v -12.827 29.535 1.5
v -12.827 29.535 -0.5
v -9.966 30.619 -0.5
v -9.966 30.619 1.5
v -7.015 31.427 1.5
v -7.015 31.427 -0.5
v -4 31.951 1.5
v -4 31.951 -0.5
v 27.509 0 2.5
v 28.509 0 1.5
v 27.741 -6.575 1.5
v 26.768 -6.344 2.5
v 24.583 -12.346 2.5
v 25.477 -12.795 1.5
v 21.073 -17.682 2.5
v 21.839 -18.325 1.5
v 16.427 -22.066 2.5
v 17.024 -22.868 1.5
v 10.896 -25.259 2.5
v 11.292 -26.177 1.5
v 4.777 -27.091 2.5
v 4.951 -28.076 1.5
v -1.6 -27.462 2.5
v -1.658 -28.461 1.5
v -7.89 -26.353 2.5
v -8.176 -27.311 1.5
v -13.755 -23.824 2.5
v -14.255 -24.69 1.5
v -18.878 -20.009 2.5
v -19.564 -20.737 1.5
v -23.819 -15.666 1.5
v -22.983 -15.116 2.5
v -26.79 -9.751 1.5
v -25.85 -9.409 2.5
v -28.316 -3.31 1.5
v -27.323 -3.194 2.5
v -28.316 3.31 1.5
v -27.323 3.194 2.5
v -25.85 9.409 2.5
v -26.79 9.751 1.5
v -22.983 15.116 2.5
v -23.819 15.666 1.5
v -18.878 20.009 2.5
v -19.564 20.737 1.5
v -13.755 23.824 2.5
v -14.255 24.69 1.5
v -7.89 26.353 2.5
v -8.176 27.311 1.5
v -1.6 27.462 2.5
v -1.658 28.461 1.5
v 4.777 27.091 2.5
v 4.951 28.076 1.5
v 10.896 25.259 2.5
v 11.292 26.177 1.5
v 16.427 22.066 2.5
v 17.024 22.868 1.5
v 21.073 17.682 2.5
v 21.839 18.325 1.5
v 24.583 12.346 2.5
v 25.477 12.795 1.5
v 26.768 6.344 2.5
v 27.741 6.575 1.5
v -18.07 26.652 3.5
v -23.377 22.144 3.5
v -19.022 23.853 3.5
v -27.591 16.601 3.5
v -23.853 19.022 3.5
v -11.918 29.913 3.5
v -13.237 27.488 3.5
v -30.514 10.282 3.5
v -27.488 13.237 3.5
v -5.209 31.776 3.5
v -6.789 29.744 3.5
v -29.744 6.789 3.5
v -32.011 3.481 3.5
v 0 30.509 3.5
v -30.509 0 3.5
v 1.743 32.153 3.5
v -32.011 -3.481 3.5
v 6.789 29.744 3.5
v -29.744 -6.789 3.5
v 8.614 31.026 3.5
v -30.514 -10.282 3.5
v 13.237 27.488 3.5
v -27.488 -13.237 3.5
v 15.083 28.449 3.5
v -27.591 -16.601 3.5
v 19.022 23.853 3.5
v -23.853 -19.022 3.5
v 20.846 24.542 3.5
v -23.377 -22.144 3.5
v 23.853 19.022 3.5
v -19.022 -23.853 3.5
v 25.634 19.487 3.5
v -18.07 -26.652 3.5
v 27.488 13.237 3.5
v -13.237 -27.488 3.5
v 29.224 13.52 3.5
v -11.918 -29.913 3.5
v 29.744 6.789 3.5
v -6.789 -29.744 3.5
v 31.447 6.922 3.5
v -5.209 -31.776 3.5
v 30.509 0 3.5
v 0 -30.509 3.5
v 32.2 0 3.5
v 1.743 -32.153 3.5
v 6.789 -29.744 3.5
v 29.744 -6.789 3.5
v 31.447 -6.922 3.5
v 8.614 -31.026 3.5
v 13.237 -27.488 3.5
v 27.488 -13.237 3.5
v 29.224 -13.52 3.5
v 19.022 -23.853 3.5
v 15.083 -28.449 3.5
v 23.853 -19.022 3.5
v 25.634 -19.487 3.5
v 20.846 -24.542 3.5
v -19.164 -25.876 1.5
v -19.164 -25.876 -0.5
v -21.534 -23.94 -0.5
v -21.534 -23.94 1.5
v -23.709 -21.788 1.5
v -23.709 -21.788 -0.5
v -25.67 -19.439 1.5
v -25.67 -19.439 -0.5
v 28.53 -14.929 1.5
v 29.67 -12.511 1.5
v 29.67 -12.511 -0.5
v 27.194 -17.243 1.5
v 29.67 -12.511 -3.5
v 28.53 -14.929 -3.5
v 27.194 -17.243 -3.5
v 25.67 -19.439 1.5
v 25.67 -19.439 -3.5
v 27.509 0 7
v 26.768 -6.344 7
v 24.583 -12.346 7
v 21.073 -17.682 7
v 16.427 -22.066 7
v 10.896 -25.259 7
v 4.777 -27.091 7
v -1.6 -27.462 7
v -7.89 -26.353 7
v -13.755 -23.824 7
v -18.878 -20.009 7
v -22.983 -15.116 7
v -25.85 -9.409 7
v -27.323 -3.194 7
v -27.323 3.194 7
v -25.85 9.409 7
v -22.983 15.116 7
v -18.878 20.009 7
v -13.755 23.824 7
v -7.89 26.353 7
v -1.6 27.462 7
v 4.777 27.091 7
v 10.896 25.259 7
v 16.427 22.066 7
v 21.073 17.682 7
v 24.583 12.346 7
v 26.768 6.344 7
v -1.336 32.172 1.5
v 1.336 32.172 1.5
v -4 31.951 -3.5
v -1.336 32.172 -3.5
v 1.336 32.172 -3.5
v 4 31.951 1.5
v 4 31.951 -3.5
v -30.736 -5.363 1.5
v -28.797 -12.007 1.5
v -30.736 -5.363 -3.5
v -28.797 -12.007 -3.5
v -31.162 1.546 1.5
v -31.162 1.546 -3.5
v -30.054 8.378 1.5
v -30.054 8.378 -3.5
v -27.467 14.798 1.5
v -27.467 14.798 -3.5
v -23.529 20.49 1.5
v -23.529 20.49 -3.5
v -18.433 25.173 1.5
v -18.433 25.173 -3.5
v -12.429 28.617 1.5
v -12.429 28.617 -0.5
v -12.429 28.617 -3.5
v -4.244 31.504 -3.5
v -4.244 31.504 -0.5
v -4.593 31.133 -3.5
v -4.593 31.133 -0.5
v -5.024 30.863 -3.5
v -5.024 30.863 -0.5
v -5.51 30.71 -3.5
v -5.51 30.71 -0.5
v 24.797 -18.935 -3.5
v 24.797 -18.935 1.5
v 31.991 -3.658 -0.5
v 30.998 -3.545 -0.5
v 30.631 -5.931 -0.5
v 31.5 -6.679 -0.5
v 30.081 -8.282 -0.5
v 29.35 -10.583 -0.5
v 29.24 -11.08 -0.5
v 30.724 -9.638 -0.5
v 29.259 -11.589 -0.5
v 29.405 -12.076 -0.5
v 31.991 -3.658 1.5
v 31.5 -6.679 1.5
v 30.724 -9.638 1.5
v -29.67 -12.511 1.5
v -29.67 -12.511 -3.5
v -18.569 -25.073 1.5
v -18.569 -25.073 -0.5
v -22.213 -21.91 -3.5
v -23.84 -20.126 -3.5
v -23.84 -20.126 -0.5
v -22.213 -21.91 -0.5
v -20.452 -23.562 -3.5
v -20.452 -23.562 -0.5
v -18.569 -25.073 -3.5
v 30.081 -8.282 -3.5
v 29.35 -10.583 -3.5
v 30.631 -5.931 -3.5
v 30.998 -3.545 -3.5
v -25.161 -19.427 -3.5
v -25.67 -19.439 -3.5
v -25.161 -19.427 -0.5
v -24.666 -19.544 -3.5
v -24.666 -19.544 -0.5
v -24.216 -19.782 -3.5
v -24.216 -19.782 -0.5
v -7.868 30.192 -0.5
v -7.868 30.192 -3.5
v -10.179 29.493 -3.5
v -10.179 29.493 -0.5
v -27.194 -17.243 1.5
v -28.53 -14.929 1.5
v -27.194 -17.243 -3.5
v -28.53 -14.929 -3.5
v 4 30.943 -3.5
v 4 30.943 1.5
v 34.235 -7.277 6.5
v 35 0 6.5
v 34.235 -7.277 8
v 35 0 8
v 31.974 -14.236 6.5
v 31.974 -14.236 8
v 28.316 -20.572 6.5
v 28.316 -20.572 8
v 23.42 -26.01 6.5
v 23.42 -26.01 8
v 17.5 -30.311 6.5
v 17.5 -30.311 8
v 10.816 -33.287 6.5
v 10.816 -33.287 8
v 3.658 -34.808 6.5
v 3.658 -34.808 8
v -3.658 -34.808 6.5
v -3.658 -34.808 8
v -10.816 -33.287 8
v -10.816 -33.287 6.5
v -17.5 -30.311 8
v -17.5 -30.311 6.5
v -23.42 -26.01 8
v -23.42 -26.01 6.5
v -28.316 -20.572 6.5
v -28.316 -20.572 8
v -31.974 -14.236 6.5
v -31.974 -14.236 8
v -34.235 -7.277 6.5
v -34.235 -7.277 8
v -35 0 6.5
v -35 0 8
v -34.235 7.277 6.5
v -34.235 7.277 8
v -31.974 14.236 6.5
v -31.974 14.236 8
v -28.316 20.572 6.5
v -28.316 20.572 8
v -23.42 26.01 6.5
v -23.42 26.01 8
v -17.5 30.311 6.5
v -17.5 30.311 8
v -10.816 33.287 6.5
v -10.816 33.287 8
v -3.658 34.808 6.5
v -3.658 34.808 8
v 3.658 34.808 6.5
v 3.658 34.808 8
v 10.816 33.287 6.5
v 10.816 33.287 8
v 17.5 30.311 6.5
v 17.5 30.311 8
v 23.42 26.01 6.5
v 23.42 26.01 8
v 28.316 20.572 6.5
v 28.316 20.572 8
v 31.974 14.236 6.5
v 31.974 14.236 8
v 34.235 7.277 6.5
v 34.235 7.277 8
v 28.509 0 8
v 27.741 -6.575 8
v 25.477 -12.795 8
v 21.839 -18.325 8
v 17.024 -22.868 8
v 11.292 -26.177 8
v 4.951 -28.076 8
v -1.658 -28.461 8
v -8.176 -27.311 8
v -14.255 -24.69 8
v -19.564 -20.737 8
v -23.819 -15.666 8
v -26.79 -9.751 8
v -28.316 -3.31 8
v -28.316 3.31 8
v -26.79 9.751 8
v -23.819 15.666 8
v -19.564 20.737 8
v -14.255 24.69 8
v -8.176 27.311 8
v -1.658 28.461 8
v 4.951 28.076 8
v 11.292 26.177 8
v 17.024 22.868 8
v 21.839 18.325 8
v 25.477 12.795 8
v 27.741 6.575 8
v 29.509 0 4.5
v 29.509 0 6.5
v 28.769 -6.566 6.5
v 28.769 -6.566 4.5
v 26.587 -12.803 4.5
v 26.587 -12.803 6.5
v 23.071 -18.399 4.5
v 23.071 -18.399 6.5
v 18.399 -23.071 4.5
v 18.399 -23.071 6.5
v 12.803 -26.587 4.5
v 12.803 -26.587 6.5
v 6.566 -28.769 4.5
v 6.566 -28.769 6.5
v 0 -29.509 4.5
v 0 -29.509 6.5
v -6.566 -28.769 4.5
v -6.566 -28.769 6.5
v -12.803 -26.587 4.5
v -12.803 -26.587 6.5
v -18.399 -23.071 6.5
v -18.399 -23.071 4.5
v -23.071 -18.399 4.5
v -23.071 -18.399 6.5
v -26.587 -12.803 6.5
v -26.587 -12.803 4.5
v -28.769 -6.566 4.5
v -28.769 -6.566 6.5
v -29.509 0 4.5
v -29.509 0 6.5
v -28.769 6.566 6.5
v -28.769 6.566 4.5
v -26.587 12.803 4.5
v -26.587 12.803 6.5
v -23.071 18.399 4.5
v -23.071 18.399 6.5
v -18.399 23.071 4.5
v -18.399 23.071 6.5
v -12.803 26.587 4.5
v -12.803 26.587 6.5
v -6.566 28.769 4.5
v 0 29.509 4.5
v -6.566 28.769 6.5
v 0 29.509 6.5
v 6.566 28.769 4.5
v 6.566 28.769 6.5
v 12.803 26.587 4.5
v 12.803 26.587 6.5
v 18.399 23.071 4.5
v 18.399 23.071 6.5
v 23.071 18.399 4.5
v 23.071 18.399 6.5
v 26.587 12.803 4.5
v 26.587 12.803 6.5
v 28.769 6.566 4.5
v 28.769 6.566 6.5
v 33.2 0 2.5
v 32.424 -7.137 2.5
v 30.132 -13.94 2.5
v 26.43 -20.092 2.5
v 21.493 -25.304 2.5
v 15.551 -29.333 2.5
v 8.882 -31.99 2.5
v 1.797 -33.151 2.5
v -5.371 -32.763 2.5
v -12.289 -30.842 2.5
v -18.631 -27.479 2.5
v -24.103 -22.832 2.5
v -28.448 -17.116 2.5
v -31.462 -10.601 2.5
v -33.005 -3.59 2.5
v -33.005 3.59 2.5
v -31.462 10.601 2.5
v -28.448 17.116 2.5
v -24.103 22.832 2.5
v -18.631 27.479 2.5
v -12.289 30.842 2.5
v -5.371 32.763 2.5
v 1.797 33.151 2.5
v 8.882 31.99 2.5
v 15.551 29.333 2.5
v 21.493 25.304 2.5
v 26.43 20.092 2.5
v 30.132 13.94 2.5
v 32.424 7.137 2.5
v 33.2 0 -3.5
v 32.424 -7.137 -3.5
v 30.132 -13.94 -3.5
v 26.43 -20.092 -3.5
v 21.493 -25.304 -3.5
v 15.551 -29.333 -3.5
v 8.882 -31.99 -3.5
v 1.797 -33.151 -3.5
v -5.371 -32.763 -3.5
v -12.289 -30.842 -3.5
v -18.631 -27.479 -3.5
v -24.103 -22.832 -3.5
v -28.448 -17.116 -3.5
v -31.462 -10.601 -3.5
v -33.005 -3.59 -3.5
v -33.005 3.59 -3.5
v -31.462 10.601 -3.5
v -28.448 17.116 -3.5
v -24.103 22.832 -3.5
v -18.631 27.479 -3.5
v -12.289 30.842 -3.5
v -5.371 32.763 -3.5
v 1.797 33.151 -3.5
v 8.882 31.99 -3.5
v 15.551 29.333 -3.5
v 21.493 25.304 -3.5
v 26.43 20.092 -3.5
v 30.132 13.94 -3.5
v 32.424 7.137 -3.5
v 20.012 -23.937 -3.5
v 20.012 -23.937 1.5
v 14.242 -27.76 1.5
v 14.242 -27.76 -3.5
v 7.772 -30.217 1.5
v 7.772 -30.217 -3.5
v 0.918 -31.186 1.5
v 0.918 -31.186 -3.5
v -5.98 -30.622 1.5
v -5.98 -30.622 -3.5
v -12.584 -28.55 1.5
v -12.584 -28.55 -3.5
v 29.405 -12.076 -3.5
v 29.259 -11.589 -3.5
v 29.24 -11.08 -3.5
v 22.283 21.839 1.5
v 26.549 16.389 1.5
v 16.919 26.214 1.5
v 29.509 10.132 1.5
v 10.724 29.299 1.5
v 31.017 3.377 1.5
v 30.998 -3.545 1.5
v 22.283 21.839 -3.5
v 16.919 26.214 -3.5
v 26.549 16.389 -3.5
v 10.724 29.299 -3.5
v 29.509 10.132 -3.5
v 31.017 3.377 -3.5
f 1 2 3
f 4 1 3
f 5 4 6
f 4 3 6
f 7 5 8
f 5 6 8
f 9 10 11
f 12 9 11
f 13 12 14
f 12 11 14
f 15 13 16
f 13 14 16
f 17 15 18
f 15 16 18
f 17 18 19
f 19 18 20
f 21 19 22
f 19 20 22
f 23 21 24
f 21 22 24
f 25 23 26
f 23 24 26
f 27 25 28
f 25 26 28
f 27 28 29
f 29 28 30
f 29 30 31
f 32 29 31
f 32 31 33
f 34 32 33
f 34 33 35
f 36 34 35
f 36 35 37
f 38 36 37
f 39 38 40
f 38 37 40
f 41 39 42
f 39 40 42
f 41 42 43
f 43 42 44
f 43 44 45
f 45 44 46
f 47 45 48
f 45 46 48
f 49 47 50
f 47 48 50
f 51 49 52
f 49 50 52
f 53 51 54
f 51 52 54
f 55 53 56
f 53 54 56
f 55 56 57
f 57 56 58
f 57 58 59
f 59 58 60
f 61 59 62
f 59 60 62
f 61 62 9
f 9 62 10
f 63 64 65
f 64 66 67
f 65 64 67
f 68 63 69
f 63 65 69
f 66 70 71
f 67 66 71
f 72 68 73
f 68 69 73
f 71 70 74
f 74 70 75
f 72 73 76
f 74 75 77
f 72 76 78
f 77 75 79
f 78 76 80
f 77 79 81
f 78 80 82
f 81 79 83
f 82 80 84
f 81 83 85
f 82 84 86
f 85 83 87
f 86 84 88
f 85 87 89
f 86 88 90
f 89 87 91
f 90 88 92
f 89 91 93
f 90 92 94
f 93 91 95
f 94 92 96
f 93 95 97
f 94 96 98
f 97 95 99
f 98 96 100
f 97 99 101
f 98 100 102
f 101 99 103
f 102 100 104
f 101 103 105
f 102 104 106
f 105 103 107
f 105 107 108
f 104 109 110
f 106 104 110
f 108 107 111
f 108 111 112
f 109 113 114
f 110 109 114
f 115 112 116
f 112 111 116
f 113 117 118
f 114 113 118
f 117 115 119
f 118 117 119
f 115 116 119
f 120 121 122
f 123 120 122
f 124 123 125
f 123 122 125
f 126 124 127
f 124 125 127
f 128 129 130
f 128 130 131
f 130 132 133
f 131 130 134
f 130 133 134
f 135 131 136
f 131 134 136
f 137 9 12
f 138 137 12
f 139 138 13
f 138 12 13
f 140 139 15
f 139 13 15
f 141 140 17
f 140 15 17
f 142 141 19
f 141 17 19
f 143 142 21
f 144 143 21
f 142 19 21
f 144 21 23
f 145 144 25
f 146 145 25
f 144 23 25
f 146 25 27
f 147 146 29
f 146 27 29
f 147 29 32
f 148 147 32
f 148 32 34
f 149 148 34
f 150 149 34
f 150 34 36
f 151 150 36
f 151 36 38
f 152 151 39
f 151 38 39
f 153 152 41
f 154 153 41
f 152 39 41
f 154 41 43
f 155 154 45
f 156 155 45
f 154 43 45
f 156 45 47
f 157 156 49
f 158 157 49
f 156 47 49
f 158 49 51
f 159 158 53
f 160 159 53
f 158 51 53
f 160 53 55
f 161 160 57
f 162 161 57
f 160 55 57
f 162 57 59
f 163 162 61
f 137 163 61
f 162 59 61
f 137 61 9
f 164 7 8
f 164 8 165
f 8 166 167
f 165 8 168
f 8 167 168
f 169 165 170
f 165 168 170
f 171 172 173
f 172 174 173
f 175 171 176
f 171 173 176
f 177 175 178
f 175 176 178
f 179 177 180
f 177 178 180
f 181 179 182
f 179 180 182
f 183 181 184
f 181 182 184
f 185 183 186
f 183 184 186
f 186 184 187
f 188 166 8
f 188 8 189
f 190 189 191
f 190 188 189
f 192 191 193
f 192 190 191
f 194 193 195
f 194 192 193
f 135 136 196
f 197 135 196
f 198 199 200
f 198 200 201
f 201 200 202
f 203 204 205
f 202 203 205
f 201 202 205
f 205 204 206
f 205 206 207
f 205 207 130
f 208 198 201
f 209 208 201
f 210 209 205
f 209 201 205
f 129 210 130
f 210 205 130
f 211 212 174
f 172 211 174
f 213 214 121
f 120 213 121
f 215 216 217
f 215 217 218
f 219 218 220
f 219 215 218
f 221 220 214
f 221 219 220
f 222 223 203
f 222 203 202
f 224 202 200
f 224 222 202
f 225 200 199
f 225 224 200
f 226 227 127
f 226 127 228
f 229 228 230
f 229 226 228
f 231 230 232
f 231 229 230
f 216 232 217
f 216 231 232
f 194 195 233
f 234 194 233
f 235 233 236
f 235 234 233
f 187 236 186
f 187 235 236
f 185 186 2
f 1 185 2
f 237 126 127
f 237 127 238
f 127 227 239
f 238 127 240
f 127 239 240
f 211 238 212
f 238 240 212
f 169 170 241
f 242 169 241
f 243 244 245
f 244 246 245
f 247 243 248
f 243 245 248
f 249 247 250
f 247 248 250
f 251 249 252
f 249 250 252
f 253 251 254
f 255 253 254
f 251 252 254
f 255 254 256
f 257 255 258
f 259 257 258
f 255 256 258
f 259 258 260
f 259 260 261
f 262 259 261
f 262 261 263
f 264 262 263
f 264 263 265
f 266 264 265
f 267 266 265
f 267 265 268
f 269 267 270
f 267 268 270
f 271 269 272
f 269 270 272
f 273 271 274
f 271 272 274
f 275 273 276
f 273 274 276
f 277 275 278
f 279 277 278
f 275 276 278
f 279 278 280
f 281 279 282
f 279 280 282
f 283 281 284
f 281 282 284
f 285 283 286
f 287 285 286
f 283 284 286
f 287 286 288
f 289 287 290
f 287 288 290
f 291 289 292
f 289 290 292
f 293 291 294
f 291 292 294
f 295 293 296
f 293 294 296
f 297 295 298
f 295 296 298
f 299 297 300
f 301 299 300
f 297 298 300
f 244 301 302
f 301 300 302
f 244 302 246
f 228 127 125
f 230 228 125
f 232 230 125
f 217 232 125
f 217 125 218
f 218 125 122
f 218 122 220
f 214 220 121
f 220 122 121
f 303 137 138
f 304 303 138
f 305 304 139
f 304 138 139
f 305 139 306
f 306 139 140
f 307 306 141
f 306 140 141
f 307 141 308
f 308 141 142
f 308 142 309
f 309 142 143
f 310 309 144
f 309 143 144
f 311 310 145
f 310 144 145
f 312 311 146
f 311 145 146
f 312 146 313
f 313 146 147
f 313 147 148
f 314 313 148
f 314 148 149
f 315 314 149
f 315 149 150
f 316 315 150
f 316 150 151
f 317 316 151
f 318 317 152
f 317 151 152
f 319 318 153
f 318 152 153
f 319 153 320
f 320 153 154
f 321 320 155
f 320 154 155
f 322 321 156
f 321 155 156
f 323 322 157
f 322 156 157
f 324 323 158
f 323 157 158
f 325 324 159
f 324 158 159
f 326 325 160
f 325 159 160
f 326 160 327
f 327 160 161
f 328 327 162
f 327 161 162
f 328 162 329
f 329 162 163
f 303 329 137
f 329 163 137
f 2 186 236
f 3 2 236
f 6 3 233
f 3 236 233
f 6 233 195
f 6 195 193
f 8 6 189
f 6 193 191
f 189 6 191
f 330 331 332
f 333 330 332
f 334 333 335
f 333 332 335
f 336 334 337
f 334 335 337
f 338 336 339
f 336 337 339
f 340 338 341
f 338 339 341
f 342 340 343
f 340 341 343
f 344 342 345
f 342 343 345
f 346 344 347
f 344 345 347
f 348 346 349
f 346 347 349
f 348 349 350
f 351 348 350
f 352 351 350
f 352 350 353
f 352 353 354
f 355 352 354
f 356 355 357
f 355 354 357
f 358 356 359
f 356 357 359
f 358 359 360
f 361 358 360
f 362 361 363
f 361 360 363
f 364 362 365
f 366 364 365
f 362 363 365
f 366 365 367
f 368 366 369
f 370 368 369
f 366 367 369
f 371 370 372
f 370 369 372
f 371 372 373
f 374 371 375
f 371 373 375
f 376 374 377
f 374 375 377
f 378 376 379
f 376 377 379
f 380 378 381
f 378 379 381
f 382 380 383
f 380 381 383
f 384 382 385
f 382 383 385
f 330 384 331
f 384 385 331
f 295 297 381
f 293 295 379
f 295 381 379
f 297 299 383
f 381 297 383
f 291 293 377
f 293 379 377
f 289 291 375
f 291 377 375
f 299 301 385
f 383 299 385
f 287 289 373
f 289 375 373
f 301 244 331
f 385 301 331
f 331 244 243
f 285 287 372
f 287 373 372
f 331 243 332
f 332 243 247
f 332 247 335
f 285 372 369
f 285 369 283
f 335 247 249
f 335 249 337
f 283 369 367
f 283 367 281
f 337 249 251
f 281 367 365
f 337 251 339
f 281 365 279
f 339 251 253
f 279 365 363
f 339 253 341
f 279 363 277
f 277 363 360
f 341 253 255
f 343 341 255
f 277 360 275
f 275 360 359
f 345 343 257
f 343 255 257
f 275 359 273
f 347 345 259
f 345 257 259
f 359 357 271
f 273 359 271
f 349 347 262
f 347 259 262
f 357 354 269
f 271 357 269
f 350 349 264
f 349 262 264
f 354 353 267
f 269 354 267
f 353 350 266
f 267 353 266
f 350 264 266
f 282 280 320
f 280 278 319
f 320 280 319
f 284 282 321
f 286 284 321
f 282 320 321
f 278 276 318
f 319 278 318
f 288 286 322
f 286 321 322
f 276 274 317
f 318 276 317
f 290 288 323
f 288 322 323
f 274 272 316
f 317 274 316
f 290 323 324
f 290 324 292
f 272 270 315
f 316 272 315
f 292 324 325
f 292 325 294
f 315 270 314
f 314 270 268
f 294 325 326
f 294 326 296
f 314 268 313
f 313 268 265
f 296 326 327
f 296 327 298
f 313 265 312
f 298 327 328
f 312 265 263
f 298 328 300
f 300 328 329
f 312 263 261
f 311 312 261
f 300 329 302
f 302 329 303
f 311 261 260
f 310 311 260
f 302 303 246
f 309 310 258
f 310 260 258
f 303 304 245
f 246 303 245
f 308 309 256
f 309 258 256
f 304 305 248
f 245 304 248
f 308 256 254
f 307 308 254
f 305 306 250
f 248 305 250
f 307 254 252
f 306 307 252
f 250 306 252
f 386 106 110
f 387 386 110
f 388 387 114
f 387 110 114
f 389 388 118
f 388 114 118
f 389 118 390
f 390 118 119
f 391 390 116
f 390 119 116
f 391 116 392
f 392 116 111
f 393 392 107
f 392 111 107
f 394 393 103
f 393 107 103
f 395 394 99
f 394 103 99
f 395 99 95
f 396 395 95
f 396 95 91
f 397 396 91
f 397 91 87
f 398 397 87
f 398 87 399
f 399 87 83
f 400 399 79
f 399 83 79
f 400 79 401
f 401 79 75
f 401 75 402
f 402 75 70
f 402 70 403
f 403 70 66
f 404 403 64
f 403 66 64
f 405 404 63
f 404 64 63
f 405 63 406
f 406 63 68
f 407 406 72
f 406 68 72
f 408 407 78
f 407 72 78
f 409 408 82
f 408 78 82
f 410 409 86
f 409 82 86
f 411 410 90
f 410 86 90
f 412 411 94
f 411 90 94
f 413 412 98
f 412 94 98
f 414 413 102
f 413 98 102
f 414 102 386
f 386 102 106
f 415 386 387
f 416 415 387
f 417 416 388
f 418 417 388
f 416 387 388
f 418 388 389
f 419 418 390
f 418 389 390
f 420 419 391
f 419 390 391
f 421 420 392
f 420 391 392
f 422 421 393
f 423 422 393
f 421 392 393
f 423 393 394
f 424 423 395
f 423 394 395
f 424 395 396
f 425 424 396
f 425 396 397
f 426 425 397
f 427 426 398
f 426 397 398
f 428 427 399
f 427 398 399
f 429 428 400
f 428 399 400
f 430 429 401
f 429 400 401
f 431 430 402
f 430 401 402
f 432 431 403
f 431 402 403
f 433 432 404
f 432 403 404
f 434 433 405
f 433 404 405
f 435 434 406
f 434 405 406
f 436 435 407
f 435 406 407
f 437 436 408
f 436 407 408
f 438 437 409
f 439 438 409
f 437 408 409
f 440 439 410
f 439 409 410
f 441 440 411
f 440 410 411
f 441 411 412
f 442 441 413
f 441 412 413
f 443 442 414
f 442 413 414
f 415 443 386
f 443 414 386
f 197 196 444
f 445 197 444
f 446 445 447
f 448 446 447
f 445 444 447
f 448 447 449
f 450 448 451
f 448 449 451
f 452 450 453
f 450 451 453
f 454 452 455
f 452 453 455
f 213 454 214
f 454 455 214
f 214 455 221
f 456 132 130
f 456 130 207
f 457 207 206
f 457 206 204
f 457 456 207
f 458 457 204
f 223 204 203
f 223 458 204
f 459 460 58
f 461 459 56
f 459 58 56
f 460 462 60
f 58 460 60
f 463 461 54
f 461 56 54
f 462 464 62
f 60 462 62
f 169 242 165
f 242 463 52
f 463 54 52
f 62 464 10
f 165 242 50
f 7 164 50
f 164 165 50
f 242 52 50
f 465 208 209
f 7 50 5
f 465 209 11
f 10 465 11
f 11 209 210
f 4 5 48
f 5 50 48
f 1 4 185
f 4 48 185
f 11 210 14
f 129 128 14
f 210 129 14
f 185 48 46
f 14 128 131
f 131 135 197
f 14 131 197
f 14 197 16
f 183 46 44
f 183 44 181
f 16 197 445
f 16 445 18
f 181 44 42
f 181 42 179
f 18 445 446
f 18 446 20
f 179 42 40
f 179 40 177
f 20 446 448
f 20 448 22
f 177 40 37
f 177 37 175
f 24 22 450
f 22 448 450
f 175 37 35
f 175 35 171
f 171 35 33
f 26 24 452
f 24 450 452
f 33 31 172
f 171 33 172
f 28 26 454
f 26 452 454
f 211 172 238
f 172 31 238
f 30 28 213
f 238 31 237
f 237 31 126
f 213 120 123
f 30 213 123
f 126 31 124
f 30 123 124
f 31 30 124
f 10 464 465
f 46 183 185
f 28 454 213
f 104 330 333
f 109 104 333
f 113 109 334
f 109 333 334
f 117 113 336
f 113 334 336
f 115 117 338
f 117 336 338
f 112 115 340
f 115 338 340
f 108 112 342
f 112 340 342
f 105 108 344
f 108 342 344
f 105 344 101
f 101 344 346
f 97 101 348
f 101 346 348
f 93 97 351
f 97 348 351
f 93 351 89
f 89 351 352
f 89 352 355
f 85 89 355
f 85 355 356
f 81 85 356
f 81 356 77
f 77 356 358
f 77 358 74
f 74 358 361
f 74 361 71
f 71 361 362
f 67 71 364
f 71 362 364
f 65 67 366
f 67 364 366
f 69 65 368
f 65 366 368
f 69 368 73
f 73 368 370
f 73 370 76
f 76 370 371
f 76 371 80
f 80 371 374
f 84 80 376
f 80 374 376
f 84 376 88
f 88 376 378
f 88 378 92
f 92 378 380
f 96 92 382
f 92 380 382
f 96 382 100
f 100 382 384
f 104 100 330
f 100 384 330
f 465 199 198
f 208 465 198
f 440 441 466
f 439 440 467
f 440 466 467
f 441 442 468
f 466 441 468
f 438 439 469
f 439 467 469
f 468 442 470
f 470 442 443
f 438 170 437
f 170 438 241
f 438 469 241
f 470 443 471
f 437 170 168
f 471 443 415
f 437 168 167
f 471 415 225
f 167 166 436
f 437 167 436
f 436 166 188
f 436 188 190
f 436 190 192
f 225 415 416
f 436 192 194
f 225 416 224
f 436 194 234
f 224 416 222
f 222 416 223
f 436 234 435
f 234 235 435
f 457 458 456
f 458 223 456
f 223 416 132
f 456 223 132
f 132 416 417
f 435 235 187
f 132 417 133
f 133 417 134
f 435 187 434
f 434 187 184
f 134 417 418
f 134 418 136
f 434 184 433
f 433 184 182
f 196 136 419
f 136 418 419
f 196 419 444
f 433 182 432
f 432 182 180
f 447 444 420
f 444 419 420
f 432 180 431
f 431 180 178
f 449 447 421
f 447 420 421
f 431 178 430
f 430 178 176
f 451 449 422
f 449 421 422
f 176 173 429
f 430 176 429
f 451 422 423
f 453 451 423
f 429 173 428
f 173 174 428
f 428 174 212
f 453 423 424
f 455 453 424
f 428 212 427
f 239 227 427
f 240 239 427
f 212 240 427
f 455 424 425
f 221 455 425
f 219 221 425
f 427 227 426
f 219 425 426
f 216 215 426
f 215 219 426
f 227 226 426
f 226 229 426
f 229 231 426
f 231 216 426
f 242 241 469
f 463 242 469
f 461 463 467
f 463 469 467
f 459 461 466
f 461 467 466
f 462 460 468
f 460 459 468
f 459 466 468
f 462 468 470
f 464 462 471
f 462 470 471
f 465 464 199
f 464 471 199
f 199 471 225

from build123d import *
from build123d import SkipClean  # not in build123d's __all__

# Parameters (mm, degrees)
F0_W        = 2
F0_H        = 2
F0_H_2      = 3
F2_SIZE     = 1
F4_DEPTH    = 5
F5_DEPTH    = 3
F6_T4_DEPTH = 10.6380386618
F6_T6_DEPTH = 6.8190193309
F6_T8_DEPTH = 6.8190193309


# Not quite as in the source:
# - a fillet or chamfer that OpenCascade refuses, or shapes differently, is made with other operations: its cross-section is extruded or revolved along the edge and cut away or added


with BuildPart() as f1:
    # F0 (on Front) → F1 (revolve)
    with BuildSketch(Plane.XZ):
        Polygon((33.2, -3.5), (33.2, 3.5), (29.5090141887, 3.5), (29.5090141887, 1.5), (31.2, 1.5), (31.2, -3.5), align=None)
        with Locations((28.5090141887, 2.5)):
            Rectangle(F0_W, F0_H)
        with Locations((28.5090141887, 5)):
            Rectangle(F0_W, F0_H_2)
        Polygon((27.5090141887, 6.5), (29.5090141887, 6.5), (35, 6.5), (35, 8), (27.5090141887, 8), align=None)
    revolve(axis=Axis((0, 0, 0.081283506), (0, 0, -1)))

    # F2
    f2_edges = [f1.edges().sort_by_distance(p)[0] for p in [
        (-33.2, 0, 3.5),
        (-27.509014, 0, 1.5),
        (-29.509014, 0, 3.5),
        (-27.509014, 0, 8),
    ]]
    chamfer(f2_edges, length=F2_SIZE)

    # F3 (on face) → F4 (cut, through all)
    with BuildSketch(Plane(origin=(0, 0, -3.5), x_dir=(1, 0, 0), z_dir=(0, 0, -1))):
        with BuildLine():
            ThreePointArc((-4, -31.9505868491), (0, -32.2), (4, -31.9505868491))
            Line((4, -31.9505868491), (4, -30.9425273693))
            ThreePointArc((4, -30.9425273693), (0, -31.2), (-4, -30.9425273693))
            Line((-4, -30.9425273693), (-4, -31.9505868491))
        make_face()
        with BuildLine():
            ThreePointArc((-12.8274571452, -29.5346634176), (-8.5, -31.0578492494), (-4, -31.9505868491))
            Line((-4, -31.9505868491), (-4, -30.9425273693))
            ThreePointArc((-4, -30.9425273693), (-8.2963998779, -30.0767310236), (-12.4290889109, -28.6174378456))
            Line((-12.4290889109, -28.6174378456), (-12.8274571452, -29.5346634176))
        make_face()
        with BuildLine():
            ThreePointArc((-25.6700198771, 19.4393950397), (-27.8860180019, 16.1), (-29.6700198771, 12.5111918094))
            Line((-29.6700198771, 12.5111918094), (-28.7970147591, 12.0071620695))
            ThreePointArc((-28.7970147591, 12.0071620695), (-27.0199925981, 15.6), (-24.7970147591, 18.9353652998))
            Line((-24.7970147591, 18.9353652998), (-25.6700198771, 19.4393950397))
        make_face()
        with BuildLine():
            Line((-18.5688837101, 25.0726256655), (-19.1640402392, 25.8762354625))
            ThreePointArc((-19.1640402392, 25.8762354625), (-22.6468864369, 22.8901405569), (-25.6700198771, 19.4393950397))
            Line((-25.6700198771, 19.4393950397), (-24.7970147591, 18.9353652998))
            ThreePointArc((-24.7970147591, 18.9353652998), (-21.8990131903, 22.223258566), (-18.5688837101, 25.0726256655))
        make_face()
        with BuildLine():
            Line((30.9979726209, 3.5448121801), (31.9914973844, 3.6584279551))
            ThreePointArc((31.9914973844, 3.6584279551), (31.1468864369, 8.1677086925), (29.6700198771, 12.5111918094))
            Line((29.6700198771, 12.5111918094), (28.7970147591, 12.0071620695))
            ThreePointArc((28.7970147591, 12.0071620695), (30.1954130682, 7.8534724576), (30.9979726209, 3.5448121801))
        make_face()
        with BuildLine():
            Line((28.7970147591, 12.0071620695), (29.6700198771, 12.5111918094))
            ThreePointArc((29.6700198771, 12.5111918094), (27.8860180019, 16.1), (25.6700198771, 19.4393950397))
            Line((25.6700198771, 19.4393950397), (24.7970147591, 18.9353652998))
            ThreePointArc((24.7970147591, 18.9353652998), (27.0199925981, 15.6), (28.7970147591, 12.0071620695))
        make_face()
    extrude(amount=-F4_DEPTH, mode=Mode.SUBTRACT)

    # F3 (on face) → F5 (join)
    with BuildSketch(Plane(origin=(0, 0, -3.5), x_dir=(1, 0, 0), z_dir=(0, 0, -1))):
        with BuildLine():
            ThreePointArc((4, -31.9505868491), (24.1416652284, -21.3077450707), (32.2, 0))
            ThreePointArc((32.2, 0), (32.1478320869, 1.8321823356), (31.9914973844, 3.6584279551))
            Line((31.9914973844, 3.6584279551), (30.9979726209, 3.5448121801))
            ThreePointArc((30.9979726209, 3.5448121801), (31.1494522084, 1.775282263), (31.2, 0))
            ThreePointArc((31.2, 0), (23.4333096254, -20.5990291033), (4, -30.9425273693))
            Line((4, -30.9425273693), (4, -31.9505868491))
        make_face()
        with BuildLine():
            Line((30.9979726209, 3.5448121801), (31.9914973844, 3.6584279551))
            ThreePointArc((31.9914973844, 3.6584279551), (31.1468864369, 8.1677086925), (29.6700198771, 12.5111918094))
            Line((29.6700198771, 12.5111918094), (28.7970147591, 12.0071620695))
            ThreePointArc((28.7970147591, 12.0071620695), (30.1954130682, 7.8534724576), (30.9979726209, 3.5448121801))
        make_face()
        with BuildLine():
            ThreePointArc((-12.8274571452, -29.5346634176), (-8.5, -31.0578492494), (-4, -31.9505868491))
            Line((-4, -31.9505868491), (-4, -30.9425273693))
            ThreePointArc((-4, -30.9425273693), (-8.2963998779, -30.0767310236), (-12.4290889109, -28.6174378456))
            Line((-12.4290889109, -28.6174378456), (-12.8274571452, -29.5346634176))
        make_face()
        with BuildLine():
            Line((-18.5688837101, 25.0726256655), (-19.1640402392, 25.8762354625))
            ThreePointArc((-19.1640402392, 25.8762354625), (-22.6468864369, 22.8901405569), (-25.6700198771, 19.4393950397))
            Line((-25.6700198771, 19.4393950397), (-24.7970147591, 18.9353652998))
            ThreePointArc((-24.7970147591, 18.9353652998), (-21.8990131903, 22.223258566), (-18.5688837101, 25.0726256655))
        make_face()
    with SkipClean():  # cleaning this boolean's faces spoils the solid; the shape is the same uncleaned
        extrude(amount=-F5_DEPTH)

    # F6: fillet of radius 2 on 3 edges, made by hand


with BuildPart() as f6_tool2:
    # F6_s3 → F6_t4 (new body)
    with BuildSketch(Plane.XY.offset(-7.3190193309)):
        with BuildLine():
            ThreePointArc((-4, 31.9505868491), (-4.5929852552, 31.1331579467), (-5.5097528505, 30.7096503322))
            ThreePointArc((-5.5097528505, 30.7096503322), (-4.7563018983, 30.8353302601), (-4, 30.9425273693))
            Line((-4, 30.9425273693), (-4, 31.9505868491))
        make_face()
    extrude(amount=F6_T4_DEPTH)

    split(bisect_by=Plane.XY.offset(1.5), keep=Keep.BOTTOM)


with BuildPart() as f1_1:
    add(f1.part, clean=False)

    # F6_t1: cut F6_tool2
    add(f6_tool2.part, mode=Mode.SUBTRACT)

    # F6_s7 → F6_t6 (cut)
    with BuildSketch(Plane.XY.offset(-7.3190193309)):
        with BuildLine():
            ThreePointArc((-25.6700198771, -19.4393950397), (-24.6656130543, -19.5442208835), (-23.8404609038, -20.1264111032))
            ThreePointArc((-23.8404609038, -20.1264111032), (-24.3260283902, -19.5367434021), (-24.7970147591, -18.9353652998))
            Line((-24.7970147591, -18.9353652998), (-25.6700198771, -19.4393950397))
        make_face()
    extrude(amount=F6_T6_DEPTH, mode=Mode.SUBTRACT)

    # F6_s9 → F6_t8 (cut)
    with BuildSketch(Plane.XY.offset(-7.3190193309)):
        with BuildLine():
            ThreePointArc((29.6700198771, -12.5111918094), (29.2585983094, -11.5889370631), (29.3502137543, -10.583239229))
            ThreePointArc((29.3502137543, -10.583239229), (29.0823302885, -11.2985868581), (28.7970147591, -12.0071620695))
            Line((28.7970147591, -12.0071620695), (29.6700198771, -12.5111918094))
        make_face()
    extrude(amount=F6_T8_DEPTH, mode=Mode.SUBTRACT)


solid = f1_1.part
